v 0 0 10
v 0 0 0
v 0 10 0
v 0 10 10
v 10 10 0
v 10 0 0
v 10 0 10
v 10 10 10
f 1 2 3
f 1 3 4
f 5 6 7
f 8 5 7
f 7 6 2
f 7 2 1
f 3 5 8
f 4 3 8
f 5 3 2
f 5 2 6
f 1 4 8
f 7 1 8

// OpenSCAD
points = [
  [0,10,0],[0,0,0],[0,0,10], // Triangle 1 / 12
  [0,10,10],[0,10,0],[0,0,10],
  [10,0,10],[10,0,0],[10,10,0],
  [10,0,10],[10,10,0],[10,10,10],
  [0,0,0],[10,0,0],[10,0,10],
  [0,0,10],[0,0,0],[10,0,10],
  [10,10,10],[10,10,0],[0,10,0],
  [10,10,10],[0,10,0],[0,10,10],
  [0,0,0],[0,10,0],[10,10,0],
  [10,0,0],[0,0,0],[10,10,0], // Triangle 10 / 12
  [10,10,10],[0,10,10],[0,0,10],
  [10,10,10],[0,0,10],[10,0,10],
];
faces = [
  [0,1,2], // Triangle 1 / 12
  [3,4,5],
  [6,7,8],
  [9,10,11],
  [12,13,14],
  [15,16,17],
  [18,19,20],
  [21,22,23],
  [24,25,26],
  [27,28,29], // Triangle 10 / 12
  [30,31,32],
  [33,34,35],
];
module solid_object() {
  polyhedron (points,faces);
}

solid_object();
